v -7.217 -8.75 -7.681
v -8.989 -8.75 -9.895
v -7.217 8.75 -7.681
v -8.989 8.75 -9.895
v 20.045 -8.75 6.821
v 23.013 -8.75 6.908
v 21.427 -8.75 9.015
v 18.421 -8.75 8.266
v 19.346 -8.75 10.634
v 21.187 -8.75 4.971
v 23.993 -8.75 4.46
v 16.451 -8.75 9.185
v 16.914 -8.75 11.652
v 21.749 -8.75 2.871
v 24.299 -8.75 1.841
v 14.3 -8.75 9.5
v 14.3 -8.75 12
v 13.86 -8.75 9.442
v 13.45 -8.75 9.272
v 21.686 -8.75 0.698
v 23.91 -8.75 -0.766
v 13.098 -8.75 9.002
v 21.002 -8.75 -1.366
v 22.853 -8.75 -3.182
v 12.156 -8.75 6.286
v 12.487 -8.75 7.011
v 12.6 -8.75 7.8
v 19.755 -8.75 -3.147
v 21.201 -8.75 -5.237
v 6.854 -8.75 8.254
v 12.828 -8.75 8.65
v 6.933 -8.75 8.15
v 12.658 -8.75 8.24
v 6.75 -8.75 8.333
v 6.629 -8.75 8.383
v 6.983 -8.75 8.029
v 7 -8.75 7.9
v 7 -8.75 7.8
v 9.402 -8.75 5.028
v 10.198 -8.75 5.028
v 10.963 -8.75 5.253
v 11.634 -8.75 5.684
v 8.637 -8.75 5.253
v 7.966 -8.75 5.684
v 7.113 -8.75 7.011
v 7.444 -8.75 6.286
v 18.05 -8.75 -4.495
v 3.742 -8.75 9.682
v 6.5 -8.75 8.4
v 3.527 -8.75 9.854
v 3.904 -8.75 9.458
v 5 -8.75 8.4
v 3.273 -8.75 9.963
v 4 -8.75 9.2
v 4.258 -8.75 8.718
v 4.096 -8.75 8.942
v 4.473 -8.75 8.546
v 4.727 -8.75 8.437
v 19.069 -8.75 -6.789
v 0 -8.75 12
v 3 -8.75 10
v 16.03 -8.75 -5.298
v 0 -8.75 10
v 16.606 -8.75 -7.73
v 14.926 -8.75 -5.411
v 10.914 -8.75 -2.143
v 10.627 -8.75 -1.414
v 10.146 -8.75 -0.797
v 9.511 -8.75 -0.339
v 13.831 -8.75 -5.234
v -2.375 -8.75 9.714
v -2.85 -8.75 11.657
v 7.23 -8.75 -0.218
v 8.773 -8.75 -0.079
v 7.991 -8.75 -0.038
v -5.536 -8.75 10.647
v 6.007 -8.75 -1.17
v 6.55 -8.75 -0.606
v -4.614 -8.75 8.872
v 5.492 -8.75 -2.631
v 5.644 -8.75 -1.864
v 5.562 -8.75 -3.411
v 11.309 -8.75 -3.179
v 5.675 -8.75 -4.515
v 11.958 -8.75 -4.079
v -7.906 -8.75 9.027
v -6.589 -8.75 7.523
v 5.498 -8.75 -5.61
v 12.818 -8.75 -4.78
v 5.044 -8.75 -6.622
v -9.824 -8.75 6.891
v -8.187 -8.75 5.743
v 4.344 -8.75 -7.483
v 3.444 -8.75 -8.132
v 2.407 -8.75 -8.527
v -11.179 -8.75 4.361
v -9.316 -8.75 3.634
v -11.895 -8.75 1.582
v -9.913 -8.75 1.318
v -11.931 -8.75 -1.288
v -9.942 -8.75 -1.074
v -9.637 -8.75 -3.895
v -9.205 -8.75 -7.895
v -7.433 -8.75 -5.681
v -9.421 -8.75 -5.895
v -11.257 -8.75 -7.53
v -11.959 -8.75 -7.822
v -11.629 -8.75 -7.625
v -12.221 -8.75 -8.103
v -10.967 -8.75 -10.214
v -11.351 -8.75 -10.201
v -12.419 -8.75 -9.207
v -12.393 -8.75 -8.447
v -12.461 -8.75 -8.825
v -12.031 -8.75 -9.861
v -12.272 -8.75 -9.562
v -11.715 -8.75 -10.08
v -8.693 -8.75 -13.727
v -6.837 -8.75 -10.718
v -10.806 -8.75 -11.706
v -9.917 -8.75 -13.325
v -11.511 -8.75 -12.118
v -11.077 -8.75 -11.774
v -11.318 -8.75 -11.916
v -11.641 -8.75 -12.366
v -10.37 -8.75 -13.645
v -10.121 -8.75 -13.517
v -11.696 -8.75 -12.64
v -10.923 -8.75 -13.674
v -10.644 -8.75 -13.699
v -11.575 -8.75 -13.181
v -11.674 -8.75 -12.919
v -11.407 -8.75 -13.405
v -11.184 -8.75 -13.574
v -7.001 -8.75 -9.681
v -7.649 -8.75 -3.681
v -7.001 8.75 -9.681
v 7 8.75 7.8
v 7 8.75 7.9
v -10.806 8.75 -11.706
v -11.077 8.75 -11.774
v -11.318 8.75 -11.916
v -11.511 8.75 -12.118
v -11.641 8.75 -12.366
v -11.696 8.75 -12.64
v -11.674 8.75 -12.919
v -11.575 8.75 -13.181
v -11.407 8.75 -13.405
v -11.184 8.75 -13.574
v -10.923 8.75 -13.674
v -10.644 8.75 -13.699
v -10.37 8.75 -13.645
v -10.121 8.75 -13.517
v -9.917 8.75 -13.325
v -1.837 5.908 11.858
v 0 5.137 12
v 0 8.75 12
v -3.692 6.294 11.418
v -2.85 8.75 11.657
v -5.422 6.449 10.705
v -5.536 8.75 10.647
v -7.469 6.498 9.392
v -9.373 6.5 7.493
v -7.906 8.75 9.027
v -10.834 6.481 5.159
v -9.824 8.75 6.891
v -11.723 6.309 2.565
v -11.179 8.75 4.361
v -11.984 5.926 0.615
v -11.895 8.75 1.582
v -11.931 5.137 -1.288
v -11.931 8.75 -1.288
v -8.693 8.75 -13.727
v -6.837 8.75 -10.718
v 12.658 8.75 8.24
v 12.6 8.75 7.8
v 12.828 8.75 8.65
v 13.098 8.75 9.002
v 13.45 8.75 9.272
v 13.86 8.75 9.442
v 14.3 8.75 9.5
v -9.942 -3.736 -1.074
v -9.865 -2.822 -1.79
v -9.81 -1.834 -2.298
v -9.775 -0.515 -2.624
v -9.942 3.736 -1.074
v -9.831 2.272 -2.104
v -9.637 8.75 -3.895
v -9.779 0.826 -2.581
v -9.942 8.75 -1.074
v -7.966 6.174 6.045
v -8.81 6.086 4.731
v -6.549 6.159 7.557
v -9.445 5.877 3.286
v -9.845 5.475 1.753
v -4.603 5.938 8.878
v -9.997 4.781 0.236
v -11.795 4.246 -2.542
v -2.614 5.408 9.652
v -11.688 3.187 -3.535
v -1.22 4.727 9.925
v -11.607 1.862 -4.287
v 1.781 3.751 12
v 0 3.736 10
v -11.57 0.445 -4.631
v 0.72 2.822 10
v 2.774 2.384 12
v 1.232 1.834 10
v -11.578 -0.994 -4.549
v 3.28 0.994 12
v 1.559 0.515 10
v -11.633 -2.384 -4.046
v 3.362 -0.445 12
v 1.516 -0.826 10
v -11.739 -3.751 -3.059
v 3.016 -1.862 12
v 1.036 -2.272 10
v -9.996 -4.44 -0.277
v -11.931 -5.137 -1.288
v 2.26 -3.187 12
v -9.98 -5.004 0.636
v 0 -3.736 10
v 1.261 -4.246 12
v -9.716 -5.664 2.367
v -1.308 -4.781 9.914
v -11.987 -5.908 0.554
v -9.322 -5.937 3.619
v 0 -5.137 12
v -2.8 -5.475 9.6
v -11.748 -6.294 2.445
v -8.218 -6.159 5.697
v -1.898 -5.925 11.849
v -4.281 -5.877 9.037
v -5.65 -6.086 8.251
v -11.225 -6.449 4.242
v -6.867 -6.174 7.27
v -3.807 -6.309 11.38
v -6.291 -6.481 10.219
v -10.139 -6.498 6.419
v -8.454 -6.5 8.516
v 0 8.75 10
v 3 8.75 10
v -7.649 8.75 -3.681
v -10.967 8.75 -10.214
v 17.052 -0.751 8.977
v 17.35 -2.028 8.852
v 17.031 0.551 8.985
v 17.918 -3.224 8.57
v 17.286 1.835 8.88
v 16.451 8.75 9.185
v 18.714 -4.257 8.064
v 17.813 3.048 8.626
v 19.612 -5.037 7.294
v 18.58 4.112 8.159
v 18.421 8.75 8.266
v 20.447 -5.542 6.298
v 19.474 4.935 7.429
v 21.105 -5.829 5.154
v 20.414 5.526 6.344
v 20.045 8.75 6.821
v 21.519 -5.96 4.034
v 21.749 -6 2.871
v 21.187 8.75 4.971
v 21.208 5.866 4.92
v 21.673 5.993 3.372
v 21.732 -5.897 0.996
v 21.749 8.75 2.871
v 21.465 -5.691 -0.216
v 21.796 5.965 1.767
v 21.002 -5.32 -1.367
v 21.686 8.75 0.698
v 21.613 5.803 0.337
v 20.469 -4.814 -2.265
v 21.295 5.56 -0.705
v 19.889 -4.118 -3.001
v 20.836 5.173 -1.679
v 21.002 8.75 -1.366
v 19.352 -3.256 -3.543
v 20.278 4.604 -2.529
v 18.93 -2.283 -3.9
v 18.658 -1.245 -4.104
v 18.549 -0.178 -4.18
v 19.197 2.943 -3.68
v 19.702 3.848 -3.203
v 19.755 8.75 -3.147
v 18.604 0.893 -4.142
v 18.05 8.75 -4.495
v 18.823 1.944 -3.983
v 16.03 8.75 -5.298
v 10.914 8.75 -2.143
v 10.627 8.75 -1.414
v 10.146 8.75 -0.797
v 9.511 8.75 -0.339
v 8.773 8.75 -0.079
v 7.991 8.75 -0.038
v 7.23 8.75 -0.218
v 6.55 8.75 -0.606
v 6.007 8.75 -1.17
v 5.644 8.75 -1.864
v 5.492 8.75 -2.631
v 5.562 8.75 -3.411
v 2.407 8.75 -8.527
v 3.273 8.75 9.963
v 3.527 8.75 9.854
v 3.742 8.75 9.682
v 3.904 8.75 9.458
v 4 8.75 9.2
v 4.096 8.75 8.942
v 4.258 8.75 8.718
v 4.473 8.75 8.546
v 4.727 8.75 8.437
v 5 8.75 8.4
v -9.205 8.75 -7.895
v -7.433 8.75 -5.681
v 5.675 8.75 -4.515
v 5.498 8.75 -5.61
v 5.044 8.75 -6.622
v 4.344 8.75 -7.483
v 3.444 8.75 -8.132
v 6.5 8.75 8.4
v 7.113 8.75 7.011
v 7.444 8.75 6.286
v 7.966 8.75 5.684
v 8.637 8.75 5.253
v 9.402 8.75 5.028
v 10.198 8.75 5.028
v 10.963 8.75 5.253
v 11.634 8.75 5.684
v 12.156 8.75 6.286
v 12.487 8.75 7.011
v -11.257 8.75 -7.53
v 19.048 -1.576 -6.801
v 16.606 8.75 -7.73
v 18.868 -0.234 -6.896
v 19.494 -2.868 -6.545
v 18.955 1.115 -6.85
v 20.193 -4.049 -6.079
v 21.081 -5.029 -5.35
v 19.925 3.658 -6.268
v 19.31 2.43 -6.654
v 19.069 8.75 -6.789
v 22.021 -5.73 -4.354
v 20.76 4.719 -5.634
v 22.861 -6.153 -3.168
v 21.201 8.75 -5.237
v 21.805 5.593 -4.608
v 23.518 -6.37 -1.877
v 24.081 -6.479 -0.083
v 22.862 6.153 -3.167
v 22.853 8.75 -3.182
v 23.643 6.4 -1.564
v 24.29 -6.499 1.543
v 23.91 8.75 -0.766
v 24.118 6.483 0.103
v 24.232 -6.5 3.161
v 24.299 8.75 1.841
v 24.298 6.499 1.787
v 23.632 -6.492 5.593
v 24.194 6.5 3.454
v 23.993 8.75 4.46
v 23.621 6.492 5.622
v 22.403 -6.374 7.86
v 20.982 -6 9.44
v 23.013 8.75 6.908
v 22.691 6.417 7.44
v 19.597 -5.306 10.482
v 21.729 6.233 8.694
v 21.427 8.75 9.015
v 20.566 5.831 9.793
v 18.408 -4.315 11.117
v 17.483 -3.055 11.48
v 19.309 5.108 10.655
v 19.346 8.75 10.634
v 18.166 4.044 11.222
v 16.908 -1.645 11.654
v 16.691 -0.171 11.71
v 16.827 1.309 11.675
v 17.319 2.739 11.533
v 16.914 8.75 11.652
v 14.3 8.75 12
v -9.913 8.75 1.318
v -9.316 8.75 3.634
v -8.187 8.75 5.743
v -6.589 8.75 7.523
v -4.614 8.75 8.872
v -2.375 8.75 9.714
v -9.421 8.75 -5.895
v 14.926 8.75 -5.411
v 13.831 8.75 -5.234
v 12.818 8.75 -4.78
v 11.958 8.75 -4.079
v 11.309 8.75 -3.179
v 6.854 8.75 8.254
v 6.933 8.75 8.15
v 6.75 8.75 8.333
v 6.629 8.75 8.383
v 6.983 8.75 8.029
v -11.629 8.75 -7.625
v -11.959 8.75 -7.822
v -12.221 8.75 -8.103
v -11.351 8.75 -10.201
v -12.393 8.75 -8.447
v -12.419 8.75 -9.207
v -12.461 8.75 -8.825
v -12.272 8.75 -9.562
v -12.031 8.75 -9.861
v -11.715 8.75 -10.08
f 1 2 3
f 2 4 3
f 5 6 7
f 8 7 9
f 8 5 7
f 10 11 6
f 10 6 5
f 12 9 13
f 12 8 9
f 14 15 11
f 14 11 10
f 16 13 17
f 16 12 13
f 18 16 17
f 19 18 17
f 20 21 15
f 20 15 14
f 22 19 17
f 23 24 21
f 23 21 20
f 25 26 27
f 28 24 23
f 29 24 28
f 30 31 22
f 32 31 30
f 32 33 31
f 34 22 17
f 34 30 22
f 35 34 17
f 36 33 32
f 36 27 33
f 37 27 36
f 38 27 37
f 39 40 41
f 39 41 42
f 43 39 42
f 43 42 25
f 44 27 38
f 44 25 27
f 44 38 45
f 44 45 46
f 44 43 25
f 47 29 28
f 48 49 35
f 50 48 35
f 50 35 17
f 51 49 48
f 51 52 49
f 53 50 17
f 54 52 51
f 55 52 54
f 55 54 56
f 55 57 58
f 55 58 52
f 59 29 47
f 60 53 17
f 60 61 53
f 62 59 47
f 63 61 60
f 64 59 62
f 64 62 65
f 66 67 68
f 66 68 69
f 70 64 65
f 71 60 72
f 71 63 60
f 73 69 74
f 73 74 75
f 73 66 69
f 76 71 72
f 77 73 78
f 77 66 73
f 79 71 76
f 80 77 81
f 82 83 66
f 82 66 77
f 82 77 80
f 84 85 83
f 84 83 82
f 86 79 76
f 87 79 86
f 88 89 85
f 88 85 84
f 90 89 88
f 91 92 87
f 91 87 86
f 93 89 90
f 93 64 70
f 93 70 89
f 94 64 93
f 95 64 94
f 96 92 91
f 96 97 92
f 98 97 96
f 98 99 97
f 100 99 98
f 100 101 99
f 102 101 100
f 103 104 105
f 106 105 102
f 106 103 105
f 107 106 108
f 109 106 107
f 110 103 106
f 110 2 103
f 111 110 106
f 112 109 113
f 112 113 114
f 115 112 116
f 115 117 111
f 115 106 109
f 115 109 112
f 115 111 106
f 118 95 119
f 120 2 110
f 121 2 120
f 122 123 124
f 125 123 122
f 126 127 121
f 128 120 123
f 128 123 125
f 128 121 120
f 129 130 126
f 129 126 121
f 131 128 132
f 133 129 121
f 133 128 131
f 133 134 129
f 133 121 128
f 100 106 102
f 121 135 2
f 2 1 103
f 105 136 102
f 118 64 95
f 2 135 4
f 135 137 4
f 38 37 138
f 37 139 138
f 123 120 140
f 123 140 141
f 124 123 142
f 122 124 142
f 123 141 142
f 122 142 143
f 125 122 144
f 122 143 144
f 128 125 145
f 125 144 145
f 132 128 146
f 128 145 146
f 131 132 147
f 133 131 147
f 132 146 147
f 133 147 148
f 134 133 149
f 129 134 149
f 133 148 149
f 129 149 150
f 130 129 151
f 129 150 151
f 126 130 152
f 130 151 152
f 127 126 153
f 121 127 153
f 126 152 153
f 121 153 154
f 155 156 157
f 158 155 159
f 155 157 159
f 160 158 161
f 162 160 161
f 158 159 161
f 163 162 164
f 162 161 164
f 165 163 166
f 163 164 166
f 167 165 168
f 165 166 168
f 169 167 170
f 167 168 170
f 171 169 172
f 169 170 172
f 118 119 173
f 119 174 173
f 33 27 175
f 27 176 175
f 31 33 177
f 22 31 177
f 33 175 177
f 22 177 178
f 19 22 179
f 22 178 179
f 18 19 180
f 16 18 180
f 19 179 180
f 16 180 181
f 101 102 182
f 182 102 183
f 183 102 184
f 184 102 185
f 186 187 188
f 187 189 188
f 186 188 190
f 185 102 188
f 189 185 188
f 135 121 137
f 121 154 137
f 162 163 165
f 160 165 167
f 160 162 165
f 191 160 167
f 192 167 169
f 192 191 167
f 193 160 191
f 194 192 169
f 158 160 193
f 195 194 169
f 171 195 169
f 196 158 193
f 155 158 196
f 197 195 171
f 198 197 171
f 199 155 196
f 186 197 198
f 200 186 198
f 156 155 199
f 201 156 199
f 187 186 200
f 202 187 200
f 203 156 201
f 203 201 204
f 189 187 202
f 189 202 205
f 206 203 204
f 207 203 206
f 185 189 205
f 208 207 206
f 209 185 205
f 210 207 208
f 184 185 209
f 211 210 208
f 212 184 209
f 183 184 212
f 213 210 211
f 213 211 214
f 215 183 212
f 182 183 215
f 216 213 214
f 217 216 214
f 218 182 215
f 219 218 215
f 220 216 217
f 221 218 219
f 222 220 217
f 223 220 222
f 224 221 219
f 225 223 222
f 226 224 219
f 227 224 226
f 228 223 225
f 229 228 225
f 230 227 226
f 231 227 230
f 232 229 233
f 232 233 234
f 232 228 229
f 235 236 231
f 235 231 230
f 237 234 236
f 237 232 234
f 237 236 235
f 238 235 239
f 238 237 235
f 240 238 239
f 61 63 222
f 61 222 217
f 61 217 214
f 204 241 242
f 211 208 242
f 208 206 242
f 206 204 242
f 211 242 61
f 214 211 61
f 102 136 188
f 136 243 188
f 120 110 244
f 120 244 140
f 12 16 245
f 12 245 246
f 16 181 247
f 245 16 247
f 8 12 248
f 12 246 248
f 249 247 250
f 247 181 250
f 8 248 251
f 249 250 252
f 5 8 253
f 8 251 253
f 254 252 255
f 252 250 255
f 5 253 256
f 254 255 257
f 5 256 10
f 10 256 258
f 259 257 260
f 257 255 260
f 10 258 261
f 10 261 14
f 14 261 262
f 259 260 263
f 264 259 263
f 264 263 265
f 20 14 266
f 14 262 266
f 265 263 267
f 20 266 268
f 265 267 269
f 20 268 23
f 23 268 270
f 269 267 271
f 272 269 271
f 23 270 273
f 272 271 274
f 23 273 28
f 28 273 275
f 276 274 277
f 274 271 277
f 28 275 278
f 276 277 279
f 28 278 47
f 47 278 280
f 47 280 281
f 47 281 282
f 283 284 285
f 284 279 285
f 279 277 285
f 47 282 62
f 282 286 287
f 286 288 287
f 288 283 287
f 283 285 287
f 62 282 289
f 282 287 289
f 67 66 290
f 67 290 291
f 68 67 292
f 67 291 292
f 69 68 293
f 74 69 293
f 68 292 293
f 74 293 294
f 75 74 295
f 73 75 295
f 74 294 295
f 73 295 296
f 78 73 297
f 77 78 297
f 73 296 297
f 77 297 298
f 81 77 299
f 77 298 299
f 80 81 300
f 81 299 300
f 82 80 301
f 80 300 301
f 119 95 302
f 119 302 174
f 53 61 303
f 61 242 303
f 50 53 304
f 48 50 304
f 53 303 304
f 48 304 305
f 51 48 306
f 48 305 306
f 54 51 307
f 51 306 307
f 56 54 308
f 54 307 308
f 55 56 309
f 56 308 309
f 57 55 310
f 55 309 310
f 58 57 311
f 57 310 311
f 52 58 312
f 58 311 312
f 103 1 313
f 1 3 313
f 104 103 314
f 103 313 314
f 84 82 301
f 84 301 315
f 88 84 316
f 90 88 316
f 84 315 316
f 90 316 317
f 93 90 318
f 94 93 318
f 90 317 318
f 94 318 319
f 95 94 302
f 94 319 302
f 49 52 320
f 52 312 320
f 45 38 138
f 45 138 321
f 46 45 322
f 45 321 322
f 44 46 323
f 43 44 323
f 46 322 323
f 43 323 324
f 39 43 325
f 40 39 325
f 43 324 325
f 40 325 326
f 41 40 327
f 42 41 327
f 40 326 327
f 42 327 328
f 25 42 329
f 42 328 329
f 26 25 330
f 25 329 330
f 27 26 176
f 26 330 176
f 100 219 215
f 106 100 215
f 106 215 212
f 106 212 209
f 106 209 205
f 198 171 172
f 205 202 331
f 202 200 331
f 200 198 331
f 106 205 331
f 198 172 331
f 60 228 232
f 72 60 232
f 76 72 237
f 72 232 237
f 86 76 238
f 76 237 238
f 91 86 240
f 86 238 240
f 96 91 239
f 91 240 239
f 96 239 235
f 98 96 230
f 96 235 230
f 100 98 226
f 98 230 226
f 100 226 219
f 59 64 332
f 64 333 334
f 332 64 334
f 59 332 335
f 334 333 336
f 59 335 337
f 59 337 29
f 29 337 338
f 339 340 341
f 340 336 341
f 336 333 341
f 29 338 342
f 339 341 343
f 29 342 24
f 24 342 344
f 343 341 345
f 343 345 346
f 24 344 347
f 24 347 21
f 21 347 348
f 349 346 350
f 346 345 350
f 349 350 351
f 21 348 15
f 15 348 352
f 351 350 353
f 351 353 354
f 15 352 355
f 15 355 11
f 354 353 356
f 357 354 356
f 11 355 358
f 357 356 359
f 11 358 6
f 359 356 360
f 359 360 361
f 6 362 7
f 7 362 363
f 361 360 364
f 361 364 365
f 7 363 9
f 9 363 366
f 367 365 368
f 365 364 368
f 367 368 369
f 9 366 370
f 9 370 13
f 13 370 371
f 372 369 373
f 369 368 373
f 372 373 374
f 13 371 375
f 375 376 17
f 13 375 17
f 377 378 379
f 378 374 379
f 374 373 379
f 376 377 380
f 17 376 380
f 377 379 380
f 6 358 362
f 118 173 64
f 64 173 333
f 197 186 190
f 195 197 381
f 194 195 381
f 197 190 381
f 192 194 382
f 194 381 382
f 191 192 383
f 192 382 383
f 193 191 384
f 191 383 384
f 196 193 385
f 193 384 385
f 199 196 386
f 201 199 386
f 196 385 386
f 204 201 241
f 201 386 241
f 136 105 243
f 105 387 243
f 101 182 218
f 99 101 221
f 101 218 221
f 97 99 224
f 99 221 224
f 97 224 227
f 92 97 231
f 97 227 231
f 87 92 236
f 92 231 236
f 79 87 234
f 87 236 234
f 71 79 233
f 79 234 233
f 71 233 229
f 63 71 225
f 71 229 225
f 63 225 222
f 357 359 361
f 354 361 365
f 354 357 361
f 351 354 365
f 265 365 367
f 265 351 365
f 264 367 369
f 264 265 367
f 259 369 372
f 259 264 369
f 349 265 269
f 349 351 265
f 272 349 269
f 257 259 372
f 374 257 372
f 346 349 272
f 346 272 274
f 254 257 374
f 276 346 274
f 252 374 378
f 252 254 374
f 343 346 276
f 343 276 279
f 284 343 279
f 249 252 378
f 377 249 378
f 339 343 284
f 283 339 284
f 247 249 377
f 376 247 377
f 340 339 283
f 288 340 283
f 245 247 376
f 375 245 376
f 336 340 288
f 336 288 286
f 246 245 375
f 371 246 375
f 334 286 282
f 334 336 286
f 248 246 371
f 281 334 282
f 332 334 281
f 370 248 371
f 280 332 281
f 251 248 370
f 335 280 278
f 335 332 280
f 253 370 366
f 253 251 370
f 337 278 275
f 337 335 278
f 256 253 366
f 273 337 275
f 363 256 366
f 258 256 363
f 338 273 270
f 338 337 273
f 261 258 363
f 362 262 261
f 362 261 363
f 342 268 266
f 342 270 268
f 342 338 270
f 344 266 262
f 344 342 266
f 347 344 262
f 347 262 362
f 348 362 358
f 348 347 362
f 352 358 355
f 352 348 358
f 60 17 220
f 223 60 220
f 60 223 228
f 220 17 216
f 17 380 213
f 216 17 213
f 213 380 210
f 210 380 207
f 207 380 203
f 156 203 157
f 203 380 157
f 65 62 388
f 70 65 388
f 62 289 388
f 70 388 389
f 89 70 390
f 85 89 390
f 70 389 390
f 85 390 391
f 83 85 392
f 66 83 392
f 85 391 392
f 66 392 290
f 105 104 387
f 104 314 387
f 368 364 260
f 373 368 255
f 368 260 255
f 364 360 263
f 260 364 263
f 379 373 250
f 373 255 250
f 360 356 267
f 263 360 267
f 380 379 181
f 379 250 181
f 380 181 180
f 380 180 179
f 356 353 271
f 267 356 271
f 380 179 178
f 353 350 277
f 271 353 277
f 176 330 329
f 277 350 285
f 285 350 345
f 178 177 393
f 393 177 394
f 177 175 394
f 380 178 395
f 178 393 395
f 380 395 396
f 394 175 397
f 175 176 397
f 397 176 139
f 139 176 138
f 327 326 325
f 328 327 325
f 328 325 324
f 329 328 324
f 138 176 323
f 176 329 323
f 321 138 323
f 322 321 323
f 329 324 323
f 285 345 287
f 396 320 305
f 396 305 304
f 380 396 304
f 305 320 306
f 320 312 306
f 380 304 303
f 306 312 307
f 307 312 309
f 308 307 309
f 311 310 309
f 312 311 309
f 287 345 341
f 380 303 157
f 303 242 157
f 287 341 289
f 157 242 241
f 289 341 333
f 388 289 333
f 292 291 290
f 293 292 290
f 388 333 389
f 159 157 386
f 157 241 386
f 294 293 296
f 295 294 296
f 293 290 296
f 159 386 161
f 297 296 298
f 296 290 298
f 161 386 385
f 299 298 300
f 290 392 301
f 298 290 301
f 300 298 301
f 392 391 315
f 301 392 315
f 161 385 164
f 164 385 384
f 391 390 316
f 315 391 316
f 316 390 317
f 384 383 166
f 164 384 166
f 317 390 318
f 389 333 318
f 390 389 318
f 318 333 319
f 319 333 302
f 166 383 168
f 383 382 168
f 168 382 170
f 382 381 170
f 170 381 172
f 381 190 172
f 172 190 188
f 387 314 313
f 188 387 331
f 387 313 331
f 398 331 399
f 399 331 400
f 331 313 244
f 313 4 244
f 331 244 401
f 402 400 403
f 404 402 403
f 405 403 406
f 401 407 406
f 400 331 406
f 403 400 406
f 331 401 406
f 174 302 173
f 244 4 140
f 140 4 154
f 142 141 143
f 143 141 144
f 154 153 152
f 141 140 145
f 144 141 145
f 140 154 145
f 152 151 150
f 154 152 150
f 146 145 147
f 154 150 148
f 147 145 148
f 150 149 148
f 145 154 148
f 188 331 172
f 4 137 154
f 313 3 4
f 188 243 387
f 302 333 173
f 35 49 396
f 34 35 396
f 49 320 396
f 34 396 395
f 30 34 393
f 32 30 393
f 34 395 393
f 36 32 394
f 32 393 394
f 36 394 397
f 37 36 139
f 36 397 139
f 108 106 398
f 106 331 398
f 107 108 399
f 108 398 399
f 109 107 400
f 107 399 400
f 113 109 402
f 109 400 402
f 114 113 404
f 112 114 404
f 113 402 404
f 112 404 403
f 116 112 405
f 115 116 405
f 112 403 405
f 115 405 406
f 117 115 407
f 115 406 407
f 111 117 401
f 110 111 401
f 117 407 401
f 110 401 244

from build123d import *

# Parameters (mm, degrees)
BOSS_EXTRUDE3_DEPTH     = 8.75
CUT_EXTRUDE1_DEPTH      = 30.433335283
CUT_EXTRUDE1_DEPTH_BACK = 30.433335283
SKETCH2_R               = 6.5
CUT_EXTRUDE2_DEPTH      = 30.248560932
CUT_EXTRUDE2_DEPTH_BACK = 30.248560932
SKETCH3_R               = 6.5


with BuildPart() as part:
    # Sketch1 → Boss-Extrude3 (new, symmetric)
    with BuildSketch(Plane(origin=(0, 0, 0), x_dir=(1, 0, 0), z_dir=(0, 1, 0))):
        with BuildLine():
            Line((14.3, -12), (0, -12))
            ThreePointArc((0, -12), (-8.929217577, -8.016799453), (-11.930624431, 1.288487755))
            Line((-11.930624431, 1.288487755), (-11.256544629, 7.530062747))
            ThreePointArc((-11.256544629, 7.530062747), (-12.453785005, 9.017212868), (-10.966634884, 10.214453244))
            Line((-10.966634884, 10.214453244), (-10.805573915, 11.705781297))
            ThreePointArc((-10.805573915, 11.705781297), (-11.574951792, 13.180943013), (-9.917441597, 13.324833112))
            Line((-9.917441597, 13.324833112), (-7.001026651, 9.680635575))
            Line((-7.001026651, 9.680635575), (-8.989464056, 9.895383534))
            Line((-8.989464056, 9.895383534), (-7.217023351, 7.680635575))
            Line((-7.217023351, 7.680635575), (-9.205460756, 7.895383534))
            Line((-9.205460756, 7.895383534), (-7.433020052, 5.680635575))
            Line((-7.433020052, 5.680635575), (-9.421457457, 5.895383534))
            Line((-9.421457457, 5.895383534), (-7.649016752, 3.680635575))
            Line((-7.649016752, 3.680635575), (-9.637454157, 3.895383534))
            Line((-9.637454157, 3.895383534), (-9.942187026, 1.073739796))
            ThreePointArc((-9.942187026, 1.073739796), (-7.441014647, -6.680666211), (0, -10))
            Line((0, -10), (3, -10))
            ThreePointArc((3, -10), (3.640312424, -9.77539053), (4, -9.2))
            ThreePointArc((4, -9.2), (4.359687576, -8.62460947), (5, -8.4))
            Line((5, -8.4), (6.5, -8.4))
            ThreePointArc((6.5, -8.4), (6.853553391, -8.253553391), (7, -7.9))
            Line((7, -7.9), (7, -7.8))
            ThreePointArc((7, -7.8), (9.8, -5), (12.6, -7.8))
            ThreePointArc((12.6, -7.8), (13.097918472, -9.002081528), (14.3, -9.5))
            ThreePointArc((14.3, -9.5), (21.749280739, -2.870756267), (16.029735438, 5.297808939))
            ThreePointArc((16.029735438, 5.297808939), (12.818459255, 4.77966532), (10.914126957, 2.142567288))
            ThreePointArc((10.914126957, 2.142567288), (7.604027352, 0.100940338), (5.562400402, 3.411039943))
            ThreePointArc((5.562400402, 3.411039943), (5.044256782, 6.622316125), (2.407158751, 8.526648423))
            Line((2.407158751, 8.526648423), (-6.836732572, 10.717646644))
            Line((-6.836732572, 10.717646644), (-8.692757073, 13.726828103))
            Line((-8.692757073, 13.726828103), (16.606313917, 7.730411919))
            ThreePointArc((16.606313917, 7.730411919), (24.232374318, -3.161008357), (14.3, -12))
        make_face()
    extrude(amount=BOSS_EXTRUDE3_DEPTH, both=True)

    # Sketch2 → Cut-Extrude1 (cut, two sides: drawn at the far end of the back side and taken through both)
    with BuildSketch(Plane(origin=(-0.037875914, 0, 0.324026741), x_dir=(0.9932374318152281, 0, 0.11610083566060259), z_dir=(-0.11610083566060259, 0, 0.9932374318152281)).offset(-CUT_EXTRUDE1_DEPTH_BACK)):
        with Locations((24.435496946, 0)):
            Circle(SKETCH2_R)
    extrude(amount=CUT_EXTRUDE1_DEPTH + CUT_EXTRUDE1_DEPTH_BACK, mode=Mode.SUBTRACT)

    # Sketch3 → Cut-Extrude2 (cut, two sides: drawn at the far end of the back side and taken through both)
    with BuildSketch(Plane(origin=(0, 0, 0), x_dir=(-0.7441014647171004, 0, 0.6680666210834559), z_dir=(-0.6680666210834559, 0, -0.7441014647171004)).offset(-CUT_EXTRUDE2_DEPTH_BACK)):
        with Locations((12, 0)):
            Circle(SKETCH3_R)
    extrude(amount=CUT_EXTRUDE2_DEPTH + CUT_EXTRUDE2_DEPTH_BACK, mode=Mode.SUBTRACT)


solid = part.part
